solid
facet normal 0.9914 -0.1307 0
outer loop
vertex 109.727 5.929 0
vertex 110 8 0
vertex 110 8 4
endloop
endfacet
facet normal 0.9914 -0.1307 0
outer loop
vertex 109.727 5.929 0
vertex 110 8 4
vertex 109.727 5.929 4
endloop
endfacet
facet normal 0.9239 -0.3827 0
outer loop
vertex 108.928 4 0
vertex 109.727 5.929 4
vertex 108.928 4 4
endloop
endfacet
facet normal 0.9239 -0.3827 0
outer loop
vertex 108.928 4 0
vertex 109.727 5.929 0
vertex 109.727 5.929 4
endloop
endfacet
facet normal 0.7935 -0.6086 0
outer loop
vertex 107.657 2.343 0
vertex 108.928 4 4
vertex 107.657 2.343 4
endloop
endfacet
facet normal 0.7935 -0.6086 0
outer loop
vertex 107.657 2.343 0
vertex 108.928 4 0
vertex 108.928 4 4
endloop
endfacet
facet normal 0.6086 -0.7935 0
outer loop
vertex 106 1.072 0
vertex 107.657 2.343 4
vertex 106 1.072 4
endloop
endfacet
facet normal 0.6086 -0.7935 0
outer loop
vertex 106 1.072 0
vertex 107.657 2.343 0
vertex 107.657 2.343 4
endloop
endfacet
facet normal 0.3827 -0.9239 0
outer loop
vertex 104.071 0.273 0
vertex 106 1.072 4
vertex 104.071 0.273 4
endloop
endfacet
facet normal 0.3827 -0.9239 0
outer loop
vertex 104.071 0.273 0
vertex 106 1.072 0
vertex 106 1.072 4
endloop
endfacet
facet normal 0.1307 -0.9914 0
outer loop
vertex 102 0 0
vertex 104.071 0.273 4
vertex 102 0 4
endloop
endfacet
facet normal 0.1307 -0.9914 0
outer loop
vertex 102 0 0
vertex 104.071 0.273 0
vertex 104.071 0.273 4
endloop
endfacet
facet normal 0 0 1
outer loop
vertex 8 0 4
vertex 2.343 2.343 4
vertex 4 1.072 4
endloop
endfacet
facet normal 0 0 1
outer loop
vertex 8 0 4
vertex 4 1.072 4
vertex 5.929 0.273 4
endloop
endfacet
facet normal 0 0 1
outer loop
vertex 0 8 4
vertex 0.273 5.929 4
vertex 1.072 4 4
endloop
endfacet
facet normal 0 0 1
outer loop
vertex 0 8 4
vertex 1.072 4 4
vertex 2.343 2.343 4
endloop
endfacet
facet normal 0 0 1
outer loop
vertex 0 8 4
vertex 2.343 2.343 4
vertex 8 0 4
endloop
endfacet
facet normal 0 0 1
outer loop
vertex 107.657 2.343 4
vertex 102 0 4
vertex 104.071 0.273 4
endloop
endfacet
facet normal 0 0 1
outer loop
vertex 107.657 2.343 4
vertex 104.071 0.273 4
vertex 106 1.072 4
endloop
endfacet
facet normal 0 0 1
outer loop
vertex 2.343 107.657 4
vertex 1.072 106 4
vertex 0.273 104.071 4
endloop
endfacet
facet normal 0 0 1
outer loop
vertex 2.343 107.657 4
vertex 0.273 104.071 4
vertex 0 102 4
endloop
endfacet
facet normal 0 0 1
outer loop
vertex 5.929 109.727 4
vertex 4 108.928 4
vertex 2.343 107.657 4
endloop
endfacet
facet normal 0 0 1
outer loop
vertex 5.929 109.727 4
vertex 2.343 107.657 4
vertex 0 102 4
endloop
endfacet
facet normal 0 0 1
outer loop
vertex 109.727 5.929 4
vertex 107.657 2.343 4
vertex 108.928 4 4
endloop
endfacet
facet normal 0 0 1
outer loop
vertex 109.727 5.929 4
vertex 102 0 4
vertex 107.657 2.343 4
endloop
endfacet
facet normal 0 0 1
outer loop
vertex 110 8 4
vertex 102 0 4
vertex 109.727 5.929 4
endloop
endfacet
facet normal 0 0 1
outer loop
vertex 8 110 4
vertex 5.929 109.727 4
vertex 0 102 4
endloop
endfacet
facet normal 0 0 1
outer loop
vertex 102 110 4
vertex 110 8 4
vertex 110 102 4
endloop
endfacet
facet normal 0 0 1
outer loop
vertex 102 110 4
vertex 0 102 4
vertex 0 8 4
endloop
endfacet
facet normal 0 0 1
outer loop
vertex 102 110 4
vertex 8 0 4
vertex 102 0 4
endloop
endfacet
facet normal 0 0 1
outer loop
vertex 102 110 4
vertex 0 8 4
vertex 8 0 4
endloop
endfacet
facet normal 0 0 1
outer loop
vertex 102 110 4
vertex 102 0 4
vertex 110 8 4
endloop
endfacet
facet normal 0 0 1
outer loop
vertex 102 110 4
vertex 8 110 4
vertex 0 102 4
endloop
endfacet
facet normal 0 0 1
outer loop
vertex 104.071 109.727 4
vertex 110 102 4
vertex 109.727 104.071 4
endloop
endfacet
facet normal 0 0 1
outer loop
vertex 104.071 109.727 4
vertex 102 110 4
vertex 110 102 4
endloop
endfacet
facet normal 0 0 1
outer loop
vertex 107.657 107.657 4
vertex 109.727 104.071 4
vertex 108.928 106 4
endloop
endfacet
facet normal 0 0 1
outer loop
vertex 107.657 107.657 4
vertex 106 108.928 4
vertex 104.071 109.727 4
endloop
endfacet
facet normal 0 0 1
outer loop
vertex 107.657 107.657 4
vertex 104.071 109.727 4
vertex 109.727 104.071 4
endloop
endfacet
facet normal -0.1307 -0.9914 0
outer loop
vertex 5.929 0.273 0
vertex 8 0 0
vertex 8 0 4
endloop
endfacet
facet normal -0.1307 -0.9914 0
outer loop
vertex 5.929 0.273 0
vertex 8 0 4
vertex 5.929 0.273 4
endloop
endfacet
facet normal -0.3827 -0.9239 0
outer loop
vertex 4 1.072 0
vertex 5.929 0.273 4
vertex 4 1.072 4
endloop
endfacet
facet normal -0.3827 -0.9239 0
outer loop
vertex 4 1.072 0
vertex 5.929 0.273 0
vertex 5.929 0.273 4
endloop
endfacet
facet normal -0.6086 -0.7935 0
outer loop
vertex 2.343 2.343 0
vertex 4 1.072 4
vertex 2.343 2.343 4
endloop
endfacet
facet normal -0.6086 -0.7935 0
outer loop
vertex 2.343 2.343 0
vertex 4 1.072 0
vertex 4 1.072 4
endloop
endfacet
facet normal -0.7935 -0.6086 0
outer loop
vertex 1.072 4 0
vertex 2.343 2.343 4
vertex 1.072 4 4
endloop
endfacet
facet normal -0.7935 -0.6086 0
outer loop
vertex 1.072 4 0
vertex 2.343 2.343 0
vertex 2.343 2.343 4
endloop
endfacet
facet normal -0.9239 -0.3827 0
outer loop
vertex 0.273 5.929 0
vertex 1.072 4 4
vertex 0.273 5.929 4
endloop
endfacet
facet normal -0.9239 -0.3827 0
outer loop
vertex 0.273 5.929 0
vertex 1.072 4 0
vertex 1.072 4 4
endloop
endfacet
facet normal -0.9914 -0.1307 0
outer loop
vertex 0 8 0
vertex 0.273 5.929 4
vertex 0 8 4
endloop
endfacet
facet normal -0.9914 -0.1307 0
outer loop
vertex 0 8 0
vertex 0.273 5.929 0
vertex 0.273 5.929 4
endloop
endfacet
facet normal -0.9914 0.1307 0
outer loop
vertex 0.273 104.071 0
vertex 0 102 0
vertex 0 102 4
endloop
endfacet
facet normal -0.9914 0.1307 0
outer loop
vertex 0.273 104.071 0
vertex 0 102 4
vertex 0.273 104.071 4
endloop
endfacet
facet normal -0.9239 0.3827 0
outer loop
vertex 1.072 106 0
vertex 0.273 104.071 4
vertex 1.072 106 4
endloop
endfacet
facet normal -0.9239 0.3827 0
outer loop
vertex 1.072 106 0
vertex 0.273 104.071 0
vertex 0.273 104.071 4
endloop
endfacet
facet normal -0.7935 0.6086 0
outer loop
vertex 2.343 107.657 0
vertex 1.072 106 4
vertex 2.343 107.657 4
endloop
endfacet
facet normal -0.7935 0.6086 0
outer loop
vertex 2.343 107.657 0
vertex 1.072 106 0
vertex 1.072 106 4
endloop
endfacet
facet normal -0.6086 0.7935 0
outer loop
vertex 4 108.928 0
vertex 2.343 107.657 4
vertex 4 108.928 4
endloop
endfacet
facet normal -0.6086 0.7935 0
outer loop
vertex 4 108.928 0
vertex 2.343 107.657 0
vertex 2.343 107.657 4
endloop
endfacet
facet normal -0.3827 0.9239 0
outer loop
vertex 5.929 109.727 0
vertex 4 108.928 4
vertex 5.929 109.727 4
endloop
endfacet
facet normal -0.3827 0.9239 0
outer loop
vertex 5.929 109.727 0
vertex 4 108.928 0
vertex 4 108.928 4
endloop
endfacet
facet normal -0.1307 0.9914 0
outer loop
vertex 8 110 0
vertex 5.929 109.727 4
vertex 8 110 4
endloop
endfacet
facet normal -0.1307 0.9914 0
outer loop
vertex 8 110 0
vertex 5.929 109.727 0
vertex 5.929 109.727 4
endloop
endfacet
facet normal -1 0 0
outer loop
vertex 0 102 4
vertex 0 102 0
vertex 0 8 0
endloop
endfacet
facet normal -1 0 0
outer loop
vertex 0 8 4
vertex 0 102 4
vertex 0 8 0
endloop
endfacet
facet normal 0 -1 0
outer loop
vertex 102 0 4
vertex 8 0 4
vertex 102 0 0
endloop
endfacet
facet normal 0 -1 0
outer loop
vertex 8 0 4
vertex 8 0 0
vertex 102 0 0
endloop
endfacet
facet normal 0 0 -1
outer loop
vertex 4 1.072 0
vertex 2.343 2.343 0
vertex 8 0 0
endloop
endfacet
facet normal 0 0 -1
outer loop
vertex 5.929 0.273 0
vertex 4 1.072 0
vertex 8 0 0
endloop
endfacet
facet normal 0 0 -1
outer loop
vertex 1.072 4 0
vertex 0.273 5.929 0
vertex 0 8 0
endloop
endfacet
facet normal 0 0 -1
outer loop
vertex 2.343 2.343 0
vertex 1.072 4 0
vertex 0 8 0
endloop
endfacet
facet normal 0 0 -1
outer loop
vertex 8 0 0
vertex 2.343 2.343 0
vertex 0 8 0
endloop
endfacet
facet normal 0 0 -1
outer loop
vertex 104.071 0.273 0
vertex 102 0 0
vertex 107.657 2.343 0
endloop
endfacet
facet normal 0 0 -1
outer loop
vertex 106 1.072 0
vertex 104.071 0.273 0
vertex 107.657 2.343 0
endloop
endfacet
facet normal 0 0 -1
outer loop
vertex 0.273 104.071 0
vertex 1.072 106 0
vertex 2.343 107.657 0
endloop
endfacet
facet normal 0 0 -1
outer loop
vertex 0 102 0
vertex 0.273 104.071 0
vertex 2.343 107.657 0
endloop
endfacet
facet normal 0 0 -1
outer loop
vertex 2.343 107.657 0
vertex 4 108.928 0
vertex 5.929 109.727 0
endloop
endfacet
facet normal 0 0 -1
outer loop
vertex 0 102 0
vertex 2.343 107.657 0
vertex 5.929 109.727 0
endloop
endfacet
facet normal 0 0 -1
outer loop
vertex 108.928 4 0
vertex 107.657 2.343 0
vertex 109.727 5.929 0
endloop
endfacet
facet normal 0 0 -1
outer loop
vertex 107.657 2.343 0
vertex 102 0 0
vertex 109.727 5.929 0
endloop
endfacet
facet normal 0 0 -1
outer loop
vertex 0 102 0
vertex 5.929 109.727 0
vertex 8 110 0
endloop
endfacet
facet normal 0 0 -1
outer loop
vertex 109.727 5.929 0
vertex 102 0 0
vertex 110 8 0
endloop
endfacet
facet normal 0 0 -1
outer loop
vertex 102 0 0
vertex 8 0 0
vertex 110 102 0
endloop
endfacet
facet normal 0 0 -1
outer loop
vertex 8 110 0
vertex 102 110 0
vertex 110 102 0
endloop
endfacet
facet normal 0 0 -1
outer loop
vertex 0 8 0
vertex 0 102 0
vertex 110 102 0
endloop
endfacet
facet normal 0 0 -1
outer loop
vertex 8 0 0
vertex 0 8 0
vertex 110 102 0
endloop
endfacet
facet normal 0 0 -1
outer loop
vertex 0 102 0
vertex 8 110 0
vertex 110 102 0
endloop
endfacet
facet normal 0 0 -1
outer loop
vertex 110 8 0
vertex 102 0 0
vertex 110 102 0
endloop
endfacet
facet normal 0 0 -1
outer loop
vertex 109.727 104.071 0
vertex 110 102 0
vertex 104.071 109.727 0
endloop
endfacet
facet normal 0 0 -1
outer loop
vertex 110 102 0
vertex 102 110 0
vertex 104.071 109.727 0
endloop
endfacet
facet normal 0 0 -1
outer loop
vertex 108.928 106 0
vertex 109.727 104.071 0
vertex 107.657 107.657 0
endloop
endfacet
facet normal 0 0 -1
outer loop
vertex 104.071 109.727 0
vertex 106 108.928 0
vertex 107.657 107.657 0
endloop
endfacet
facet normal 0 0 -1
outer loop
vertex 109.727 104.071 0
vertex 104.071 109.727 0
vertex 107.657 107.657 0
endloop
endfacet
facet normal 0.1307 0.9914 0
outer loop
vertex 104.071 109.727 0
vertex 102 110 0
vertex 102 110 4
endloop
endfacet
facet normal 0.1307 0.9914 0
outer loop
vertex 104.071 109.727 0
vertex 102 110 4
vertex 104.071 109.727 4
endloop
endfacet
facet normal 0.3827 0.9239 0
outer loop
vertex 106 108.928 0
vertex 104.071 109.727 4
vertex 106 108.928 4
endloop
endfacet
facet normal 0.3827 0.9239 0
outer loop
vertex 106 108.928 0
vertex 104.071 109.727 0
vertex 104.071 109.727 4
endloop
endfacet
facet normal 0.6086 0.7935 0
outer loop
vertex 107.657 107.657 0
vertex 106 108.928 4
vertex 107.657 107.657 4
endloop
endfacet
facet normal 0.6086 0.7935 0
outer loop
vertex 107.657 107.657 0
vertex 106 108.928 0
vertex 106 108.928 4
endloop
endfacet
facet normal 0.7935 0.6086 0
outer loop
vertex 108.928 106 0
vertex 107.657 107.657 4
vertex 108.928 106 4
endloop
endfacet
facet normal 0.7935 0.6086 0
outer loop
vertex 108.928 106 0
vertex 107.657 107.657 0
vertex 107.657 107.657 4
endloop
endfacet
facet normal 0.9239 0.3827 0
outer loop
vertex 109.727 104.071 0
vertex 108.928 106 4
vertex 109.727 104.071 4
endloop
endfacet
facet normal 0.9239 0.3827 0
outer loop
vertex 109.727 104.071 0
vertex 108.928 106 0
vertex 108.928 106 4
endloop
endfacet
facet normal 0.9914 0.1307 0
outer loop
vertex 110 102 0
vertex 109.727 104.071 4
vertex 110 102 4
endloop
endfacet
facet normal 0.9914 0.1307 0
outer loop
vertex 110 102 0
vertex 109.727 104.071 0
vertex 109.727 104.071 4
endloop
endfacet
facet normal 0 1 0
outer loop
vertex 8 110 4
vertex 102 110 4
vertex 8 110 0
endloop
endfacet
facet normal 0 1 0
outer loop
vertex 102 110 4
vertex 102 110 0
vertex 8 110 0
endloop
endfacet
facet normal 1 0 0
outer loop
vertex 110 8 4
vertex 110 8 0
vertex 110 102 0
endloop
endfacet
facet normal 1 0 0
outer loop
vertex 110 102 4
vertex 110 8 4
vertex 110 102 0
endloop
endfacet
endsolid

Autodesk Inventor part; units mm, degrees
ref_plane "YZ Plane" through (0, 0, 0) normal (1, 0, 0) x (0, 1, 0)
ref_plane "XZ Plane" through (0, 0, 0) normal (0, 1, 0) x (-1, 0, 0)
ref_plane "XY Plane" through (0, 0, 0) normal (0, 0, 1) x (1, 0, 0)
sketch "Sketch1" plane through (0, 0, 0) normal (0, 0, 1) x (1, 0, 0)
  line L0 (8, 0) -> (102, 0)
  line L1 (110, 8) -> (110, 102)
  line L2 (102, 110) -> (8, 110)
  line L3 (0, 102) -> (0, 8)
  arc A0 (2.5, 110) -> (0, 107.5) centre (2.5, 107.5) ccw
  arc A1 (110, 102) -> (102, 110) centre (102, 102) ccw
  arc A2 (8, 110) -> (0, 102) centre (8, 102) ccw
  arc A3 (0, 8) -> (8, 0) centre (8, 8) ccw
  arc A4 (102, 0) -> (110, 8) centre (102, 8) ccw
  circle A5 centre (55, 55) radius 5
  point P0 (0, 0)
  point P1 (110, 110)
  point P2 (110, 0)
  point P3 (0, 110)
  dimension "d0" = 110
  dimension "d1" = 110
  dimension "d3" = 8
  dimension "d4" = 8
  dimension "d6" = 8
  dimension "d9" = 10
extrude "Extrusion1" add sketch "Sketch1" along normal blind 4 contours A3 L3 A2 L2 A1 L1 A4 L0 | A5
properties part number "PistonFeederHeadMini" material "Stainless Steel"
